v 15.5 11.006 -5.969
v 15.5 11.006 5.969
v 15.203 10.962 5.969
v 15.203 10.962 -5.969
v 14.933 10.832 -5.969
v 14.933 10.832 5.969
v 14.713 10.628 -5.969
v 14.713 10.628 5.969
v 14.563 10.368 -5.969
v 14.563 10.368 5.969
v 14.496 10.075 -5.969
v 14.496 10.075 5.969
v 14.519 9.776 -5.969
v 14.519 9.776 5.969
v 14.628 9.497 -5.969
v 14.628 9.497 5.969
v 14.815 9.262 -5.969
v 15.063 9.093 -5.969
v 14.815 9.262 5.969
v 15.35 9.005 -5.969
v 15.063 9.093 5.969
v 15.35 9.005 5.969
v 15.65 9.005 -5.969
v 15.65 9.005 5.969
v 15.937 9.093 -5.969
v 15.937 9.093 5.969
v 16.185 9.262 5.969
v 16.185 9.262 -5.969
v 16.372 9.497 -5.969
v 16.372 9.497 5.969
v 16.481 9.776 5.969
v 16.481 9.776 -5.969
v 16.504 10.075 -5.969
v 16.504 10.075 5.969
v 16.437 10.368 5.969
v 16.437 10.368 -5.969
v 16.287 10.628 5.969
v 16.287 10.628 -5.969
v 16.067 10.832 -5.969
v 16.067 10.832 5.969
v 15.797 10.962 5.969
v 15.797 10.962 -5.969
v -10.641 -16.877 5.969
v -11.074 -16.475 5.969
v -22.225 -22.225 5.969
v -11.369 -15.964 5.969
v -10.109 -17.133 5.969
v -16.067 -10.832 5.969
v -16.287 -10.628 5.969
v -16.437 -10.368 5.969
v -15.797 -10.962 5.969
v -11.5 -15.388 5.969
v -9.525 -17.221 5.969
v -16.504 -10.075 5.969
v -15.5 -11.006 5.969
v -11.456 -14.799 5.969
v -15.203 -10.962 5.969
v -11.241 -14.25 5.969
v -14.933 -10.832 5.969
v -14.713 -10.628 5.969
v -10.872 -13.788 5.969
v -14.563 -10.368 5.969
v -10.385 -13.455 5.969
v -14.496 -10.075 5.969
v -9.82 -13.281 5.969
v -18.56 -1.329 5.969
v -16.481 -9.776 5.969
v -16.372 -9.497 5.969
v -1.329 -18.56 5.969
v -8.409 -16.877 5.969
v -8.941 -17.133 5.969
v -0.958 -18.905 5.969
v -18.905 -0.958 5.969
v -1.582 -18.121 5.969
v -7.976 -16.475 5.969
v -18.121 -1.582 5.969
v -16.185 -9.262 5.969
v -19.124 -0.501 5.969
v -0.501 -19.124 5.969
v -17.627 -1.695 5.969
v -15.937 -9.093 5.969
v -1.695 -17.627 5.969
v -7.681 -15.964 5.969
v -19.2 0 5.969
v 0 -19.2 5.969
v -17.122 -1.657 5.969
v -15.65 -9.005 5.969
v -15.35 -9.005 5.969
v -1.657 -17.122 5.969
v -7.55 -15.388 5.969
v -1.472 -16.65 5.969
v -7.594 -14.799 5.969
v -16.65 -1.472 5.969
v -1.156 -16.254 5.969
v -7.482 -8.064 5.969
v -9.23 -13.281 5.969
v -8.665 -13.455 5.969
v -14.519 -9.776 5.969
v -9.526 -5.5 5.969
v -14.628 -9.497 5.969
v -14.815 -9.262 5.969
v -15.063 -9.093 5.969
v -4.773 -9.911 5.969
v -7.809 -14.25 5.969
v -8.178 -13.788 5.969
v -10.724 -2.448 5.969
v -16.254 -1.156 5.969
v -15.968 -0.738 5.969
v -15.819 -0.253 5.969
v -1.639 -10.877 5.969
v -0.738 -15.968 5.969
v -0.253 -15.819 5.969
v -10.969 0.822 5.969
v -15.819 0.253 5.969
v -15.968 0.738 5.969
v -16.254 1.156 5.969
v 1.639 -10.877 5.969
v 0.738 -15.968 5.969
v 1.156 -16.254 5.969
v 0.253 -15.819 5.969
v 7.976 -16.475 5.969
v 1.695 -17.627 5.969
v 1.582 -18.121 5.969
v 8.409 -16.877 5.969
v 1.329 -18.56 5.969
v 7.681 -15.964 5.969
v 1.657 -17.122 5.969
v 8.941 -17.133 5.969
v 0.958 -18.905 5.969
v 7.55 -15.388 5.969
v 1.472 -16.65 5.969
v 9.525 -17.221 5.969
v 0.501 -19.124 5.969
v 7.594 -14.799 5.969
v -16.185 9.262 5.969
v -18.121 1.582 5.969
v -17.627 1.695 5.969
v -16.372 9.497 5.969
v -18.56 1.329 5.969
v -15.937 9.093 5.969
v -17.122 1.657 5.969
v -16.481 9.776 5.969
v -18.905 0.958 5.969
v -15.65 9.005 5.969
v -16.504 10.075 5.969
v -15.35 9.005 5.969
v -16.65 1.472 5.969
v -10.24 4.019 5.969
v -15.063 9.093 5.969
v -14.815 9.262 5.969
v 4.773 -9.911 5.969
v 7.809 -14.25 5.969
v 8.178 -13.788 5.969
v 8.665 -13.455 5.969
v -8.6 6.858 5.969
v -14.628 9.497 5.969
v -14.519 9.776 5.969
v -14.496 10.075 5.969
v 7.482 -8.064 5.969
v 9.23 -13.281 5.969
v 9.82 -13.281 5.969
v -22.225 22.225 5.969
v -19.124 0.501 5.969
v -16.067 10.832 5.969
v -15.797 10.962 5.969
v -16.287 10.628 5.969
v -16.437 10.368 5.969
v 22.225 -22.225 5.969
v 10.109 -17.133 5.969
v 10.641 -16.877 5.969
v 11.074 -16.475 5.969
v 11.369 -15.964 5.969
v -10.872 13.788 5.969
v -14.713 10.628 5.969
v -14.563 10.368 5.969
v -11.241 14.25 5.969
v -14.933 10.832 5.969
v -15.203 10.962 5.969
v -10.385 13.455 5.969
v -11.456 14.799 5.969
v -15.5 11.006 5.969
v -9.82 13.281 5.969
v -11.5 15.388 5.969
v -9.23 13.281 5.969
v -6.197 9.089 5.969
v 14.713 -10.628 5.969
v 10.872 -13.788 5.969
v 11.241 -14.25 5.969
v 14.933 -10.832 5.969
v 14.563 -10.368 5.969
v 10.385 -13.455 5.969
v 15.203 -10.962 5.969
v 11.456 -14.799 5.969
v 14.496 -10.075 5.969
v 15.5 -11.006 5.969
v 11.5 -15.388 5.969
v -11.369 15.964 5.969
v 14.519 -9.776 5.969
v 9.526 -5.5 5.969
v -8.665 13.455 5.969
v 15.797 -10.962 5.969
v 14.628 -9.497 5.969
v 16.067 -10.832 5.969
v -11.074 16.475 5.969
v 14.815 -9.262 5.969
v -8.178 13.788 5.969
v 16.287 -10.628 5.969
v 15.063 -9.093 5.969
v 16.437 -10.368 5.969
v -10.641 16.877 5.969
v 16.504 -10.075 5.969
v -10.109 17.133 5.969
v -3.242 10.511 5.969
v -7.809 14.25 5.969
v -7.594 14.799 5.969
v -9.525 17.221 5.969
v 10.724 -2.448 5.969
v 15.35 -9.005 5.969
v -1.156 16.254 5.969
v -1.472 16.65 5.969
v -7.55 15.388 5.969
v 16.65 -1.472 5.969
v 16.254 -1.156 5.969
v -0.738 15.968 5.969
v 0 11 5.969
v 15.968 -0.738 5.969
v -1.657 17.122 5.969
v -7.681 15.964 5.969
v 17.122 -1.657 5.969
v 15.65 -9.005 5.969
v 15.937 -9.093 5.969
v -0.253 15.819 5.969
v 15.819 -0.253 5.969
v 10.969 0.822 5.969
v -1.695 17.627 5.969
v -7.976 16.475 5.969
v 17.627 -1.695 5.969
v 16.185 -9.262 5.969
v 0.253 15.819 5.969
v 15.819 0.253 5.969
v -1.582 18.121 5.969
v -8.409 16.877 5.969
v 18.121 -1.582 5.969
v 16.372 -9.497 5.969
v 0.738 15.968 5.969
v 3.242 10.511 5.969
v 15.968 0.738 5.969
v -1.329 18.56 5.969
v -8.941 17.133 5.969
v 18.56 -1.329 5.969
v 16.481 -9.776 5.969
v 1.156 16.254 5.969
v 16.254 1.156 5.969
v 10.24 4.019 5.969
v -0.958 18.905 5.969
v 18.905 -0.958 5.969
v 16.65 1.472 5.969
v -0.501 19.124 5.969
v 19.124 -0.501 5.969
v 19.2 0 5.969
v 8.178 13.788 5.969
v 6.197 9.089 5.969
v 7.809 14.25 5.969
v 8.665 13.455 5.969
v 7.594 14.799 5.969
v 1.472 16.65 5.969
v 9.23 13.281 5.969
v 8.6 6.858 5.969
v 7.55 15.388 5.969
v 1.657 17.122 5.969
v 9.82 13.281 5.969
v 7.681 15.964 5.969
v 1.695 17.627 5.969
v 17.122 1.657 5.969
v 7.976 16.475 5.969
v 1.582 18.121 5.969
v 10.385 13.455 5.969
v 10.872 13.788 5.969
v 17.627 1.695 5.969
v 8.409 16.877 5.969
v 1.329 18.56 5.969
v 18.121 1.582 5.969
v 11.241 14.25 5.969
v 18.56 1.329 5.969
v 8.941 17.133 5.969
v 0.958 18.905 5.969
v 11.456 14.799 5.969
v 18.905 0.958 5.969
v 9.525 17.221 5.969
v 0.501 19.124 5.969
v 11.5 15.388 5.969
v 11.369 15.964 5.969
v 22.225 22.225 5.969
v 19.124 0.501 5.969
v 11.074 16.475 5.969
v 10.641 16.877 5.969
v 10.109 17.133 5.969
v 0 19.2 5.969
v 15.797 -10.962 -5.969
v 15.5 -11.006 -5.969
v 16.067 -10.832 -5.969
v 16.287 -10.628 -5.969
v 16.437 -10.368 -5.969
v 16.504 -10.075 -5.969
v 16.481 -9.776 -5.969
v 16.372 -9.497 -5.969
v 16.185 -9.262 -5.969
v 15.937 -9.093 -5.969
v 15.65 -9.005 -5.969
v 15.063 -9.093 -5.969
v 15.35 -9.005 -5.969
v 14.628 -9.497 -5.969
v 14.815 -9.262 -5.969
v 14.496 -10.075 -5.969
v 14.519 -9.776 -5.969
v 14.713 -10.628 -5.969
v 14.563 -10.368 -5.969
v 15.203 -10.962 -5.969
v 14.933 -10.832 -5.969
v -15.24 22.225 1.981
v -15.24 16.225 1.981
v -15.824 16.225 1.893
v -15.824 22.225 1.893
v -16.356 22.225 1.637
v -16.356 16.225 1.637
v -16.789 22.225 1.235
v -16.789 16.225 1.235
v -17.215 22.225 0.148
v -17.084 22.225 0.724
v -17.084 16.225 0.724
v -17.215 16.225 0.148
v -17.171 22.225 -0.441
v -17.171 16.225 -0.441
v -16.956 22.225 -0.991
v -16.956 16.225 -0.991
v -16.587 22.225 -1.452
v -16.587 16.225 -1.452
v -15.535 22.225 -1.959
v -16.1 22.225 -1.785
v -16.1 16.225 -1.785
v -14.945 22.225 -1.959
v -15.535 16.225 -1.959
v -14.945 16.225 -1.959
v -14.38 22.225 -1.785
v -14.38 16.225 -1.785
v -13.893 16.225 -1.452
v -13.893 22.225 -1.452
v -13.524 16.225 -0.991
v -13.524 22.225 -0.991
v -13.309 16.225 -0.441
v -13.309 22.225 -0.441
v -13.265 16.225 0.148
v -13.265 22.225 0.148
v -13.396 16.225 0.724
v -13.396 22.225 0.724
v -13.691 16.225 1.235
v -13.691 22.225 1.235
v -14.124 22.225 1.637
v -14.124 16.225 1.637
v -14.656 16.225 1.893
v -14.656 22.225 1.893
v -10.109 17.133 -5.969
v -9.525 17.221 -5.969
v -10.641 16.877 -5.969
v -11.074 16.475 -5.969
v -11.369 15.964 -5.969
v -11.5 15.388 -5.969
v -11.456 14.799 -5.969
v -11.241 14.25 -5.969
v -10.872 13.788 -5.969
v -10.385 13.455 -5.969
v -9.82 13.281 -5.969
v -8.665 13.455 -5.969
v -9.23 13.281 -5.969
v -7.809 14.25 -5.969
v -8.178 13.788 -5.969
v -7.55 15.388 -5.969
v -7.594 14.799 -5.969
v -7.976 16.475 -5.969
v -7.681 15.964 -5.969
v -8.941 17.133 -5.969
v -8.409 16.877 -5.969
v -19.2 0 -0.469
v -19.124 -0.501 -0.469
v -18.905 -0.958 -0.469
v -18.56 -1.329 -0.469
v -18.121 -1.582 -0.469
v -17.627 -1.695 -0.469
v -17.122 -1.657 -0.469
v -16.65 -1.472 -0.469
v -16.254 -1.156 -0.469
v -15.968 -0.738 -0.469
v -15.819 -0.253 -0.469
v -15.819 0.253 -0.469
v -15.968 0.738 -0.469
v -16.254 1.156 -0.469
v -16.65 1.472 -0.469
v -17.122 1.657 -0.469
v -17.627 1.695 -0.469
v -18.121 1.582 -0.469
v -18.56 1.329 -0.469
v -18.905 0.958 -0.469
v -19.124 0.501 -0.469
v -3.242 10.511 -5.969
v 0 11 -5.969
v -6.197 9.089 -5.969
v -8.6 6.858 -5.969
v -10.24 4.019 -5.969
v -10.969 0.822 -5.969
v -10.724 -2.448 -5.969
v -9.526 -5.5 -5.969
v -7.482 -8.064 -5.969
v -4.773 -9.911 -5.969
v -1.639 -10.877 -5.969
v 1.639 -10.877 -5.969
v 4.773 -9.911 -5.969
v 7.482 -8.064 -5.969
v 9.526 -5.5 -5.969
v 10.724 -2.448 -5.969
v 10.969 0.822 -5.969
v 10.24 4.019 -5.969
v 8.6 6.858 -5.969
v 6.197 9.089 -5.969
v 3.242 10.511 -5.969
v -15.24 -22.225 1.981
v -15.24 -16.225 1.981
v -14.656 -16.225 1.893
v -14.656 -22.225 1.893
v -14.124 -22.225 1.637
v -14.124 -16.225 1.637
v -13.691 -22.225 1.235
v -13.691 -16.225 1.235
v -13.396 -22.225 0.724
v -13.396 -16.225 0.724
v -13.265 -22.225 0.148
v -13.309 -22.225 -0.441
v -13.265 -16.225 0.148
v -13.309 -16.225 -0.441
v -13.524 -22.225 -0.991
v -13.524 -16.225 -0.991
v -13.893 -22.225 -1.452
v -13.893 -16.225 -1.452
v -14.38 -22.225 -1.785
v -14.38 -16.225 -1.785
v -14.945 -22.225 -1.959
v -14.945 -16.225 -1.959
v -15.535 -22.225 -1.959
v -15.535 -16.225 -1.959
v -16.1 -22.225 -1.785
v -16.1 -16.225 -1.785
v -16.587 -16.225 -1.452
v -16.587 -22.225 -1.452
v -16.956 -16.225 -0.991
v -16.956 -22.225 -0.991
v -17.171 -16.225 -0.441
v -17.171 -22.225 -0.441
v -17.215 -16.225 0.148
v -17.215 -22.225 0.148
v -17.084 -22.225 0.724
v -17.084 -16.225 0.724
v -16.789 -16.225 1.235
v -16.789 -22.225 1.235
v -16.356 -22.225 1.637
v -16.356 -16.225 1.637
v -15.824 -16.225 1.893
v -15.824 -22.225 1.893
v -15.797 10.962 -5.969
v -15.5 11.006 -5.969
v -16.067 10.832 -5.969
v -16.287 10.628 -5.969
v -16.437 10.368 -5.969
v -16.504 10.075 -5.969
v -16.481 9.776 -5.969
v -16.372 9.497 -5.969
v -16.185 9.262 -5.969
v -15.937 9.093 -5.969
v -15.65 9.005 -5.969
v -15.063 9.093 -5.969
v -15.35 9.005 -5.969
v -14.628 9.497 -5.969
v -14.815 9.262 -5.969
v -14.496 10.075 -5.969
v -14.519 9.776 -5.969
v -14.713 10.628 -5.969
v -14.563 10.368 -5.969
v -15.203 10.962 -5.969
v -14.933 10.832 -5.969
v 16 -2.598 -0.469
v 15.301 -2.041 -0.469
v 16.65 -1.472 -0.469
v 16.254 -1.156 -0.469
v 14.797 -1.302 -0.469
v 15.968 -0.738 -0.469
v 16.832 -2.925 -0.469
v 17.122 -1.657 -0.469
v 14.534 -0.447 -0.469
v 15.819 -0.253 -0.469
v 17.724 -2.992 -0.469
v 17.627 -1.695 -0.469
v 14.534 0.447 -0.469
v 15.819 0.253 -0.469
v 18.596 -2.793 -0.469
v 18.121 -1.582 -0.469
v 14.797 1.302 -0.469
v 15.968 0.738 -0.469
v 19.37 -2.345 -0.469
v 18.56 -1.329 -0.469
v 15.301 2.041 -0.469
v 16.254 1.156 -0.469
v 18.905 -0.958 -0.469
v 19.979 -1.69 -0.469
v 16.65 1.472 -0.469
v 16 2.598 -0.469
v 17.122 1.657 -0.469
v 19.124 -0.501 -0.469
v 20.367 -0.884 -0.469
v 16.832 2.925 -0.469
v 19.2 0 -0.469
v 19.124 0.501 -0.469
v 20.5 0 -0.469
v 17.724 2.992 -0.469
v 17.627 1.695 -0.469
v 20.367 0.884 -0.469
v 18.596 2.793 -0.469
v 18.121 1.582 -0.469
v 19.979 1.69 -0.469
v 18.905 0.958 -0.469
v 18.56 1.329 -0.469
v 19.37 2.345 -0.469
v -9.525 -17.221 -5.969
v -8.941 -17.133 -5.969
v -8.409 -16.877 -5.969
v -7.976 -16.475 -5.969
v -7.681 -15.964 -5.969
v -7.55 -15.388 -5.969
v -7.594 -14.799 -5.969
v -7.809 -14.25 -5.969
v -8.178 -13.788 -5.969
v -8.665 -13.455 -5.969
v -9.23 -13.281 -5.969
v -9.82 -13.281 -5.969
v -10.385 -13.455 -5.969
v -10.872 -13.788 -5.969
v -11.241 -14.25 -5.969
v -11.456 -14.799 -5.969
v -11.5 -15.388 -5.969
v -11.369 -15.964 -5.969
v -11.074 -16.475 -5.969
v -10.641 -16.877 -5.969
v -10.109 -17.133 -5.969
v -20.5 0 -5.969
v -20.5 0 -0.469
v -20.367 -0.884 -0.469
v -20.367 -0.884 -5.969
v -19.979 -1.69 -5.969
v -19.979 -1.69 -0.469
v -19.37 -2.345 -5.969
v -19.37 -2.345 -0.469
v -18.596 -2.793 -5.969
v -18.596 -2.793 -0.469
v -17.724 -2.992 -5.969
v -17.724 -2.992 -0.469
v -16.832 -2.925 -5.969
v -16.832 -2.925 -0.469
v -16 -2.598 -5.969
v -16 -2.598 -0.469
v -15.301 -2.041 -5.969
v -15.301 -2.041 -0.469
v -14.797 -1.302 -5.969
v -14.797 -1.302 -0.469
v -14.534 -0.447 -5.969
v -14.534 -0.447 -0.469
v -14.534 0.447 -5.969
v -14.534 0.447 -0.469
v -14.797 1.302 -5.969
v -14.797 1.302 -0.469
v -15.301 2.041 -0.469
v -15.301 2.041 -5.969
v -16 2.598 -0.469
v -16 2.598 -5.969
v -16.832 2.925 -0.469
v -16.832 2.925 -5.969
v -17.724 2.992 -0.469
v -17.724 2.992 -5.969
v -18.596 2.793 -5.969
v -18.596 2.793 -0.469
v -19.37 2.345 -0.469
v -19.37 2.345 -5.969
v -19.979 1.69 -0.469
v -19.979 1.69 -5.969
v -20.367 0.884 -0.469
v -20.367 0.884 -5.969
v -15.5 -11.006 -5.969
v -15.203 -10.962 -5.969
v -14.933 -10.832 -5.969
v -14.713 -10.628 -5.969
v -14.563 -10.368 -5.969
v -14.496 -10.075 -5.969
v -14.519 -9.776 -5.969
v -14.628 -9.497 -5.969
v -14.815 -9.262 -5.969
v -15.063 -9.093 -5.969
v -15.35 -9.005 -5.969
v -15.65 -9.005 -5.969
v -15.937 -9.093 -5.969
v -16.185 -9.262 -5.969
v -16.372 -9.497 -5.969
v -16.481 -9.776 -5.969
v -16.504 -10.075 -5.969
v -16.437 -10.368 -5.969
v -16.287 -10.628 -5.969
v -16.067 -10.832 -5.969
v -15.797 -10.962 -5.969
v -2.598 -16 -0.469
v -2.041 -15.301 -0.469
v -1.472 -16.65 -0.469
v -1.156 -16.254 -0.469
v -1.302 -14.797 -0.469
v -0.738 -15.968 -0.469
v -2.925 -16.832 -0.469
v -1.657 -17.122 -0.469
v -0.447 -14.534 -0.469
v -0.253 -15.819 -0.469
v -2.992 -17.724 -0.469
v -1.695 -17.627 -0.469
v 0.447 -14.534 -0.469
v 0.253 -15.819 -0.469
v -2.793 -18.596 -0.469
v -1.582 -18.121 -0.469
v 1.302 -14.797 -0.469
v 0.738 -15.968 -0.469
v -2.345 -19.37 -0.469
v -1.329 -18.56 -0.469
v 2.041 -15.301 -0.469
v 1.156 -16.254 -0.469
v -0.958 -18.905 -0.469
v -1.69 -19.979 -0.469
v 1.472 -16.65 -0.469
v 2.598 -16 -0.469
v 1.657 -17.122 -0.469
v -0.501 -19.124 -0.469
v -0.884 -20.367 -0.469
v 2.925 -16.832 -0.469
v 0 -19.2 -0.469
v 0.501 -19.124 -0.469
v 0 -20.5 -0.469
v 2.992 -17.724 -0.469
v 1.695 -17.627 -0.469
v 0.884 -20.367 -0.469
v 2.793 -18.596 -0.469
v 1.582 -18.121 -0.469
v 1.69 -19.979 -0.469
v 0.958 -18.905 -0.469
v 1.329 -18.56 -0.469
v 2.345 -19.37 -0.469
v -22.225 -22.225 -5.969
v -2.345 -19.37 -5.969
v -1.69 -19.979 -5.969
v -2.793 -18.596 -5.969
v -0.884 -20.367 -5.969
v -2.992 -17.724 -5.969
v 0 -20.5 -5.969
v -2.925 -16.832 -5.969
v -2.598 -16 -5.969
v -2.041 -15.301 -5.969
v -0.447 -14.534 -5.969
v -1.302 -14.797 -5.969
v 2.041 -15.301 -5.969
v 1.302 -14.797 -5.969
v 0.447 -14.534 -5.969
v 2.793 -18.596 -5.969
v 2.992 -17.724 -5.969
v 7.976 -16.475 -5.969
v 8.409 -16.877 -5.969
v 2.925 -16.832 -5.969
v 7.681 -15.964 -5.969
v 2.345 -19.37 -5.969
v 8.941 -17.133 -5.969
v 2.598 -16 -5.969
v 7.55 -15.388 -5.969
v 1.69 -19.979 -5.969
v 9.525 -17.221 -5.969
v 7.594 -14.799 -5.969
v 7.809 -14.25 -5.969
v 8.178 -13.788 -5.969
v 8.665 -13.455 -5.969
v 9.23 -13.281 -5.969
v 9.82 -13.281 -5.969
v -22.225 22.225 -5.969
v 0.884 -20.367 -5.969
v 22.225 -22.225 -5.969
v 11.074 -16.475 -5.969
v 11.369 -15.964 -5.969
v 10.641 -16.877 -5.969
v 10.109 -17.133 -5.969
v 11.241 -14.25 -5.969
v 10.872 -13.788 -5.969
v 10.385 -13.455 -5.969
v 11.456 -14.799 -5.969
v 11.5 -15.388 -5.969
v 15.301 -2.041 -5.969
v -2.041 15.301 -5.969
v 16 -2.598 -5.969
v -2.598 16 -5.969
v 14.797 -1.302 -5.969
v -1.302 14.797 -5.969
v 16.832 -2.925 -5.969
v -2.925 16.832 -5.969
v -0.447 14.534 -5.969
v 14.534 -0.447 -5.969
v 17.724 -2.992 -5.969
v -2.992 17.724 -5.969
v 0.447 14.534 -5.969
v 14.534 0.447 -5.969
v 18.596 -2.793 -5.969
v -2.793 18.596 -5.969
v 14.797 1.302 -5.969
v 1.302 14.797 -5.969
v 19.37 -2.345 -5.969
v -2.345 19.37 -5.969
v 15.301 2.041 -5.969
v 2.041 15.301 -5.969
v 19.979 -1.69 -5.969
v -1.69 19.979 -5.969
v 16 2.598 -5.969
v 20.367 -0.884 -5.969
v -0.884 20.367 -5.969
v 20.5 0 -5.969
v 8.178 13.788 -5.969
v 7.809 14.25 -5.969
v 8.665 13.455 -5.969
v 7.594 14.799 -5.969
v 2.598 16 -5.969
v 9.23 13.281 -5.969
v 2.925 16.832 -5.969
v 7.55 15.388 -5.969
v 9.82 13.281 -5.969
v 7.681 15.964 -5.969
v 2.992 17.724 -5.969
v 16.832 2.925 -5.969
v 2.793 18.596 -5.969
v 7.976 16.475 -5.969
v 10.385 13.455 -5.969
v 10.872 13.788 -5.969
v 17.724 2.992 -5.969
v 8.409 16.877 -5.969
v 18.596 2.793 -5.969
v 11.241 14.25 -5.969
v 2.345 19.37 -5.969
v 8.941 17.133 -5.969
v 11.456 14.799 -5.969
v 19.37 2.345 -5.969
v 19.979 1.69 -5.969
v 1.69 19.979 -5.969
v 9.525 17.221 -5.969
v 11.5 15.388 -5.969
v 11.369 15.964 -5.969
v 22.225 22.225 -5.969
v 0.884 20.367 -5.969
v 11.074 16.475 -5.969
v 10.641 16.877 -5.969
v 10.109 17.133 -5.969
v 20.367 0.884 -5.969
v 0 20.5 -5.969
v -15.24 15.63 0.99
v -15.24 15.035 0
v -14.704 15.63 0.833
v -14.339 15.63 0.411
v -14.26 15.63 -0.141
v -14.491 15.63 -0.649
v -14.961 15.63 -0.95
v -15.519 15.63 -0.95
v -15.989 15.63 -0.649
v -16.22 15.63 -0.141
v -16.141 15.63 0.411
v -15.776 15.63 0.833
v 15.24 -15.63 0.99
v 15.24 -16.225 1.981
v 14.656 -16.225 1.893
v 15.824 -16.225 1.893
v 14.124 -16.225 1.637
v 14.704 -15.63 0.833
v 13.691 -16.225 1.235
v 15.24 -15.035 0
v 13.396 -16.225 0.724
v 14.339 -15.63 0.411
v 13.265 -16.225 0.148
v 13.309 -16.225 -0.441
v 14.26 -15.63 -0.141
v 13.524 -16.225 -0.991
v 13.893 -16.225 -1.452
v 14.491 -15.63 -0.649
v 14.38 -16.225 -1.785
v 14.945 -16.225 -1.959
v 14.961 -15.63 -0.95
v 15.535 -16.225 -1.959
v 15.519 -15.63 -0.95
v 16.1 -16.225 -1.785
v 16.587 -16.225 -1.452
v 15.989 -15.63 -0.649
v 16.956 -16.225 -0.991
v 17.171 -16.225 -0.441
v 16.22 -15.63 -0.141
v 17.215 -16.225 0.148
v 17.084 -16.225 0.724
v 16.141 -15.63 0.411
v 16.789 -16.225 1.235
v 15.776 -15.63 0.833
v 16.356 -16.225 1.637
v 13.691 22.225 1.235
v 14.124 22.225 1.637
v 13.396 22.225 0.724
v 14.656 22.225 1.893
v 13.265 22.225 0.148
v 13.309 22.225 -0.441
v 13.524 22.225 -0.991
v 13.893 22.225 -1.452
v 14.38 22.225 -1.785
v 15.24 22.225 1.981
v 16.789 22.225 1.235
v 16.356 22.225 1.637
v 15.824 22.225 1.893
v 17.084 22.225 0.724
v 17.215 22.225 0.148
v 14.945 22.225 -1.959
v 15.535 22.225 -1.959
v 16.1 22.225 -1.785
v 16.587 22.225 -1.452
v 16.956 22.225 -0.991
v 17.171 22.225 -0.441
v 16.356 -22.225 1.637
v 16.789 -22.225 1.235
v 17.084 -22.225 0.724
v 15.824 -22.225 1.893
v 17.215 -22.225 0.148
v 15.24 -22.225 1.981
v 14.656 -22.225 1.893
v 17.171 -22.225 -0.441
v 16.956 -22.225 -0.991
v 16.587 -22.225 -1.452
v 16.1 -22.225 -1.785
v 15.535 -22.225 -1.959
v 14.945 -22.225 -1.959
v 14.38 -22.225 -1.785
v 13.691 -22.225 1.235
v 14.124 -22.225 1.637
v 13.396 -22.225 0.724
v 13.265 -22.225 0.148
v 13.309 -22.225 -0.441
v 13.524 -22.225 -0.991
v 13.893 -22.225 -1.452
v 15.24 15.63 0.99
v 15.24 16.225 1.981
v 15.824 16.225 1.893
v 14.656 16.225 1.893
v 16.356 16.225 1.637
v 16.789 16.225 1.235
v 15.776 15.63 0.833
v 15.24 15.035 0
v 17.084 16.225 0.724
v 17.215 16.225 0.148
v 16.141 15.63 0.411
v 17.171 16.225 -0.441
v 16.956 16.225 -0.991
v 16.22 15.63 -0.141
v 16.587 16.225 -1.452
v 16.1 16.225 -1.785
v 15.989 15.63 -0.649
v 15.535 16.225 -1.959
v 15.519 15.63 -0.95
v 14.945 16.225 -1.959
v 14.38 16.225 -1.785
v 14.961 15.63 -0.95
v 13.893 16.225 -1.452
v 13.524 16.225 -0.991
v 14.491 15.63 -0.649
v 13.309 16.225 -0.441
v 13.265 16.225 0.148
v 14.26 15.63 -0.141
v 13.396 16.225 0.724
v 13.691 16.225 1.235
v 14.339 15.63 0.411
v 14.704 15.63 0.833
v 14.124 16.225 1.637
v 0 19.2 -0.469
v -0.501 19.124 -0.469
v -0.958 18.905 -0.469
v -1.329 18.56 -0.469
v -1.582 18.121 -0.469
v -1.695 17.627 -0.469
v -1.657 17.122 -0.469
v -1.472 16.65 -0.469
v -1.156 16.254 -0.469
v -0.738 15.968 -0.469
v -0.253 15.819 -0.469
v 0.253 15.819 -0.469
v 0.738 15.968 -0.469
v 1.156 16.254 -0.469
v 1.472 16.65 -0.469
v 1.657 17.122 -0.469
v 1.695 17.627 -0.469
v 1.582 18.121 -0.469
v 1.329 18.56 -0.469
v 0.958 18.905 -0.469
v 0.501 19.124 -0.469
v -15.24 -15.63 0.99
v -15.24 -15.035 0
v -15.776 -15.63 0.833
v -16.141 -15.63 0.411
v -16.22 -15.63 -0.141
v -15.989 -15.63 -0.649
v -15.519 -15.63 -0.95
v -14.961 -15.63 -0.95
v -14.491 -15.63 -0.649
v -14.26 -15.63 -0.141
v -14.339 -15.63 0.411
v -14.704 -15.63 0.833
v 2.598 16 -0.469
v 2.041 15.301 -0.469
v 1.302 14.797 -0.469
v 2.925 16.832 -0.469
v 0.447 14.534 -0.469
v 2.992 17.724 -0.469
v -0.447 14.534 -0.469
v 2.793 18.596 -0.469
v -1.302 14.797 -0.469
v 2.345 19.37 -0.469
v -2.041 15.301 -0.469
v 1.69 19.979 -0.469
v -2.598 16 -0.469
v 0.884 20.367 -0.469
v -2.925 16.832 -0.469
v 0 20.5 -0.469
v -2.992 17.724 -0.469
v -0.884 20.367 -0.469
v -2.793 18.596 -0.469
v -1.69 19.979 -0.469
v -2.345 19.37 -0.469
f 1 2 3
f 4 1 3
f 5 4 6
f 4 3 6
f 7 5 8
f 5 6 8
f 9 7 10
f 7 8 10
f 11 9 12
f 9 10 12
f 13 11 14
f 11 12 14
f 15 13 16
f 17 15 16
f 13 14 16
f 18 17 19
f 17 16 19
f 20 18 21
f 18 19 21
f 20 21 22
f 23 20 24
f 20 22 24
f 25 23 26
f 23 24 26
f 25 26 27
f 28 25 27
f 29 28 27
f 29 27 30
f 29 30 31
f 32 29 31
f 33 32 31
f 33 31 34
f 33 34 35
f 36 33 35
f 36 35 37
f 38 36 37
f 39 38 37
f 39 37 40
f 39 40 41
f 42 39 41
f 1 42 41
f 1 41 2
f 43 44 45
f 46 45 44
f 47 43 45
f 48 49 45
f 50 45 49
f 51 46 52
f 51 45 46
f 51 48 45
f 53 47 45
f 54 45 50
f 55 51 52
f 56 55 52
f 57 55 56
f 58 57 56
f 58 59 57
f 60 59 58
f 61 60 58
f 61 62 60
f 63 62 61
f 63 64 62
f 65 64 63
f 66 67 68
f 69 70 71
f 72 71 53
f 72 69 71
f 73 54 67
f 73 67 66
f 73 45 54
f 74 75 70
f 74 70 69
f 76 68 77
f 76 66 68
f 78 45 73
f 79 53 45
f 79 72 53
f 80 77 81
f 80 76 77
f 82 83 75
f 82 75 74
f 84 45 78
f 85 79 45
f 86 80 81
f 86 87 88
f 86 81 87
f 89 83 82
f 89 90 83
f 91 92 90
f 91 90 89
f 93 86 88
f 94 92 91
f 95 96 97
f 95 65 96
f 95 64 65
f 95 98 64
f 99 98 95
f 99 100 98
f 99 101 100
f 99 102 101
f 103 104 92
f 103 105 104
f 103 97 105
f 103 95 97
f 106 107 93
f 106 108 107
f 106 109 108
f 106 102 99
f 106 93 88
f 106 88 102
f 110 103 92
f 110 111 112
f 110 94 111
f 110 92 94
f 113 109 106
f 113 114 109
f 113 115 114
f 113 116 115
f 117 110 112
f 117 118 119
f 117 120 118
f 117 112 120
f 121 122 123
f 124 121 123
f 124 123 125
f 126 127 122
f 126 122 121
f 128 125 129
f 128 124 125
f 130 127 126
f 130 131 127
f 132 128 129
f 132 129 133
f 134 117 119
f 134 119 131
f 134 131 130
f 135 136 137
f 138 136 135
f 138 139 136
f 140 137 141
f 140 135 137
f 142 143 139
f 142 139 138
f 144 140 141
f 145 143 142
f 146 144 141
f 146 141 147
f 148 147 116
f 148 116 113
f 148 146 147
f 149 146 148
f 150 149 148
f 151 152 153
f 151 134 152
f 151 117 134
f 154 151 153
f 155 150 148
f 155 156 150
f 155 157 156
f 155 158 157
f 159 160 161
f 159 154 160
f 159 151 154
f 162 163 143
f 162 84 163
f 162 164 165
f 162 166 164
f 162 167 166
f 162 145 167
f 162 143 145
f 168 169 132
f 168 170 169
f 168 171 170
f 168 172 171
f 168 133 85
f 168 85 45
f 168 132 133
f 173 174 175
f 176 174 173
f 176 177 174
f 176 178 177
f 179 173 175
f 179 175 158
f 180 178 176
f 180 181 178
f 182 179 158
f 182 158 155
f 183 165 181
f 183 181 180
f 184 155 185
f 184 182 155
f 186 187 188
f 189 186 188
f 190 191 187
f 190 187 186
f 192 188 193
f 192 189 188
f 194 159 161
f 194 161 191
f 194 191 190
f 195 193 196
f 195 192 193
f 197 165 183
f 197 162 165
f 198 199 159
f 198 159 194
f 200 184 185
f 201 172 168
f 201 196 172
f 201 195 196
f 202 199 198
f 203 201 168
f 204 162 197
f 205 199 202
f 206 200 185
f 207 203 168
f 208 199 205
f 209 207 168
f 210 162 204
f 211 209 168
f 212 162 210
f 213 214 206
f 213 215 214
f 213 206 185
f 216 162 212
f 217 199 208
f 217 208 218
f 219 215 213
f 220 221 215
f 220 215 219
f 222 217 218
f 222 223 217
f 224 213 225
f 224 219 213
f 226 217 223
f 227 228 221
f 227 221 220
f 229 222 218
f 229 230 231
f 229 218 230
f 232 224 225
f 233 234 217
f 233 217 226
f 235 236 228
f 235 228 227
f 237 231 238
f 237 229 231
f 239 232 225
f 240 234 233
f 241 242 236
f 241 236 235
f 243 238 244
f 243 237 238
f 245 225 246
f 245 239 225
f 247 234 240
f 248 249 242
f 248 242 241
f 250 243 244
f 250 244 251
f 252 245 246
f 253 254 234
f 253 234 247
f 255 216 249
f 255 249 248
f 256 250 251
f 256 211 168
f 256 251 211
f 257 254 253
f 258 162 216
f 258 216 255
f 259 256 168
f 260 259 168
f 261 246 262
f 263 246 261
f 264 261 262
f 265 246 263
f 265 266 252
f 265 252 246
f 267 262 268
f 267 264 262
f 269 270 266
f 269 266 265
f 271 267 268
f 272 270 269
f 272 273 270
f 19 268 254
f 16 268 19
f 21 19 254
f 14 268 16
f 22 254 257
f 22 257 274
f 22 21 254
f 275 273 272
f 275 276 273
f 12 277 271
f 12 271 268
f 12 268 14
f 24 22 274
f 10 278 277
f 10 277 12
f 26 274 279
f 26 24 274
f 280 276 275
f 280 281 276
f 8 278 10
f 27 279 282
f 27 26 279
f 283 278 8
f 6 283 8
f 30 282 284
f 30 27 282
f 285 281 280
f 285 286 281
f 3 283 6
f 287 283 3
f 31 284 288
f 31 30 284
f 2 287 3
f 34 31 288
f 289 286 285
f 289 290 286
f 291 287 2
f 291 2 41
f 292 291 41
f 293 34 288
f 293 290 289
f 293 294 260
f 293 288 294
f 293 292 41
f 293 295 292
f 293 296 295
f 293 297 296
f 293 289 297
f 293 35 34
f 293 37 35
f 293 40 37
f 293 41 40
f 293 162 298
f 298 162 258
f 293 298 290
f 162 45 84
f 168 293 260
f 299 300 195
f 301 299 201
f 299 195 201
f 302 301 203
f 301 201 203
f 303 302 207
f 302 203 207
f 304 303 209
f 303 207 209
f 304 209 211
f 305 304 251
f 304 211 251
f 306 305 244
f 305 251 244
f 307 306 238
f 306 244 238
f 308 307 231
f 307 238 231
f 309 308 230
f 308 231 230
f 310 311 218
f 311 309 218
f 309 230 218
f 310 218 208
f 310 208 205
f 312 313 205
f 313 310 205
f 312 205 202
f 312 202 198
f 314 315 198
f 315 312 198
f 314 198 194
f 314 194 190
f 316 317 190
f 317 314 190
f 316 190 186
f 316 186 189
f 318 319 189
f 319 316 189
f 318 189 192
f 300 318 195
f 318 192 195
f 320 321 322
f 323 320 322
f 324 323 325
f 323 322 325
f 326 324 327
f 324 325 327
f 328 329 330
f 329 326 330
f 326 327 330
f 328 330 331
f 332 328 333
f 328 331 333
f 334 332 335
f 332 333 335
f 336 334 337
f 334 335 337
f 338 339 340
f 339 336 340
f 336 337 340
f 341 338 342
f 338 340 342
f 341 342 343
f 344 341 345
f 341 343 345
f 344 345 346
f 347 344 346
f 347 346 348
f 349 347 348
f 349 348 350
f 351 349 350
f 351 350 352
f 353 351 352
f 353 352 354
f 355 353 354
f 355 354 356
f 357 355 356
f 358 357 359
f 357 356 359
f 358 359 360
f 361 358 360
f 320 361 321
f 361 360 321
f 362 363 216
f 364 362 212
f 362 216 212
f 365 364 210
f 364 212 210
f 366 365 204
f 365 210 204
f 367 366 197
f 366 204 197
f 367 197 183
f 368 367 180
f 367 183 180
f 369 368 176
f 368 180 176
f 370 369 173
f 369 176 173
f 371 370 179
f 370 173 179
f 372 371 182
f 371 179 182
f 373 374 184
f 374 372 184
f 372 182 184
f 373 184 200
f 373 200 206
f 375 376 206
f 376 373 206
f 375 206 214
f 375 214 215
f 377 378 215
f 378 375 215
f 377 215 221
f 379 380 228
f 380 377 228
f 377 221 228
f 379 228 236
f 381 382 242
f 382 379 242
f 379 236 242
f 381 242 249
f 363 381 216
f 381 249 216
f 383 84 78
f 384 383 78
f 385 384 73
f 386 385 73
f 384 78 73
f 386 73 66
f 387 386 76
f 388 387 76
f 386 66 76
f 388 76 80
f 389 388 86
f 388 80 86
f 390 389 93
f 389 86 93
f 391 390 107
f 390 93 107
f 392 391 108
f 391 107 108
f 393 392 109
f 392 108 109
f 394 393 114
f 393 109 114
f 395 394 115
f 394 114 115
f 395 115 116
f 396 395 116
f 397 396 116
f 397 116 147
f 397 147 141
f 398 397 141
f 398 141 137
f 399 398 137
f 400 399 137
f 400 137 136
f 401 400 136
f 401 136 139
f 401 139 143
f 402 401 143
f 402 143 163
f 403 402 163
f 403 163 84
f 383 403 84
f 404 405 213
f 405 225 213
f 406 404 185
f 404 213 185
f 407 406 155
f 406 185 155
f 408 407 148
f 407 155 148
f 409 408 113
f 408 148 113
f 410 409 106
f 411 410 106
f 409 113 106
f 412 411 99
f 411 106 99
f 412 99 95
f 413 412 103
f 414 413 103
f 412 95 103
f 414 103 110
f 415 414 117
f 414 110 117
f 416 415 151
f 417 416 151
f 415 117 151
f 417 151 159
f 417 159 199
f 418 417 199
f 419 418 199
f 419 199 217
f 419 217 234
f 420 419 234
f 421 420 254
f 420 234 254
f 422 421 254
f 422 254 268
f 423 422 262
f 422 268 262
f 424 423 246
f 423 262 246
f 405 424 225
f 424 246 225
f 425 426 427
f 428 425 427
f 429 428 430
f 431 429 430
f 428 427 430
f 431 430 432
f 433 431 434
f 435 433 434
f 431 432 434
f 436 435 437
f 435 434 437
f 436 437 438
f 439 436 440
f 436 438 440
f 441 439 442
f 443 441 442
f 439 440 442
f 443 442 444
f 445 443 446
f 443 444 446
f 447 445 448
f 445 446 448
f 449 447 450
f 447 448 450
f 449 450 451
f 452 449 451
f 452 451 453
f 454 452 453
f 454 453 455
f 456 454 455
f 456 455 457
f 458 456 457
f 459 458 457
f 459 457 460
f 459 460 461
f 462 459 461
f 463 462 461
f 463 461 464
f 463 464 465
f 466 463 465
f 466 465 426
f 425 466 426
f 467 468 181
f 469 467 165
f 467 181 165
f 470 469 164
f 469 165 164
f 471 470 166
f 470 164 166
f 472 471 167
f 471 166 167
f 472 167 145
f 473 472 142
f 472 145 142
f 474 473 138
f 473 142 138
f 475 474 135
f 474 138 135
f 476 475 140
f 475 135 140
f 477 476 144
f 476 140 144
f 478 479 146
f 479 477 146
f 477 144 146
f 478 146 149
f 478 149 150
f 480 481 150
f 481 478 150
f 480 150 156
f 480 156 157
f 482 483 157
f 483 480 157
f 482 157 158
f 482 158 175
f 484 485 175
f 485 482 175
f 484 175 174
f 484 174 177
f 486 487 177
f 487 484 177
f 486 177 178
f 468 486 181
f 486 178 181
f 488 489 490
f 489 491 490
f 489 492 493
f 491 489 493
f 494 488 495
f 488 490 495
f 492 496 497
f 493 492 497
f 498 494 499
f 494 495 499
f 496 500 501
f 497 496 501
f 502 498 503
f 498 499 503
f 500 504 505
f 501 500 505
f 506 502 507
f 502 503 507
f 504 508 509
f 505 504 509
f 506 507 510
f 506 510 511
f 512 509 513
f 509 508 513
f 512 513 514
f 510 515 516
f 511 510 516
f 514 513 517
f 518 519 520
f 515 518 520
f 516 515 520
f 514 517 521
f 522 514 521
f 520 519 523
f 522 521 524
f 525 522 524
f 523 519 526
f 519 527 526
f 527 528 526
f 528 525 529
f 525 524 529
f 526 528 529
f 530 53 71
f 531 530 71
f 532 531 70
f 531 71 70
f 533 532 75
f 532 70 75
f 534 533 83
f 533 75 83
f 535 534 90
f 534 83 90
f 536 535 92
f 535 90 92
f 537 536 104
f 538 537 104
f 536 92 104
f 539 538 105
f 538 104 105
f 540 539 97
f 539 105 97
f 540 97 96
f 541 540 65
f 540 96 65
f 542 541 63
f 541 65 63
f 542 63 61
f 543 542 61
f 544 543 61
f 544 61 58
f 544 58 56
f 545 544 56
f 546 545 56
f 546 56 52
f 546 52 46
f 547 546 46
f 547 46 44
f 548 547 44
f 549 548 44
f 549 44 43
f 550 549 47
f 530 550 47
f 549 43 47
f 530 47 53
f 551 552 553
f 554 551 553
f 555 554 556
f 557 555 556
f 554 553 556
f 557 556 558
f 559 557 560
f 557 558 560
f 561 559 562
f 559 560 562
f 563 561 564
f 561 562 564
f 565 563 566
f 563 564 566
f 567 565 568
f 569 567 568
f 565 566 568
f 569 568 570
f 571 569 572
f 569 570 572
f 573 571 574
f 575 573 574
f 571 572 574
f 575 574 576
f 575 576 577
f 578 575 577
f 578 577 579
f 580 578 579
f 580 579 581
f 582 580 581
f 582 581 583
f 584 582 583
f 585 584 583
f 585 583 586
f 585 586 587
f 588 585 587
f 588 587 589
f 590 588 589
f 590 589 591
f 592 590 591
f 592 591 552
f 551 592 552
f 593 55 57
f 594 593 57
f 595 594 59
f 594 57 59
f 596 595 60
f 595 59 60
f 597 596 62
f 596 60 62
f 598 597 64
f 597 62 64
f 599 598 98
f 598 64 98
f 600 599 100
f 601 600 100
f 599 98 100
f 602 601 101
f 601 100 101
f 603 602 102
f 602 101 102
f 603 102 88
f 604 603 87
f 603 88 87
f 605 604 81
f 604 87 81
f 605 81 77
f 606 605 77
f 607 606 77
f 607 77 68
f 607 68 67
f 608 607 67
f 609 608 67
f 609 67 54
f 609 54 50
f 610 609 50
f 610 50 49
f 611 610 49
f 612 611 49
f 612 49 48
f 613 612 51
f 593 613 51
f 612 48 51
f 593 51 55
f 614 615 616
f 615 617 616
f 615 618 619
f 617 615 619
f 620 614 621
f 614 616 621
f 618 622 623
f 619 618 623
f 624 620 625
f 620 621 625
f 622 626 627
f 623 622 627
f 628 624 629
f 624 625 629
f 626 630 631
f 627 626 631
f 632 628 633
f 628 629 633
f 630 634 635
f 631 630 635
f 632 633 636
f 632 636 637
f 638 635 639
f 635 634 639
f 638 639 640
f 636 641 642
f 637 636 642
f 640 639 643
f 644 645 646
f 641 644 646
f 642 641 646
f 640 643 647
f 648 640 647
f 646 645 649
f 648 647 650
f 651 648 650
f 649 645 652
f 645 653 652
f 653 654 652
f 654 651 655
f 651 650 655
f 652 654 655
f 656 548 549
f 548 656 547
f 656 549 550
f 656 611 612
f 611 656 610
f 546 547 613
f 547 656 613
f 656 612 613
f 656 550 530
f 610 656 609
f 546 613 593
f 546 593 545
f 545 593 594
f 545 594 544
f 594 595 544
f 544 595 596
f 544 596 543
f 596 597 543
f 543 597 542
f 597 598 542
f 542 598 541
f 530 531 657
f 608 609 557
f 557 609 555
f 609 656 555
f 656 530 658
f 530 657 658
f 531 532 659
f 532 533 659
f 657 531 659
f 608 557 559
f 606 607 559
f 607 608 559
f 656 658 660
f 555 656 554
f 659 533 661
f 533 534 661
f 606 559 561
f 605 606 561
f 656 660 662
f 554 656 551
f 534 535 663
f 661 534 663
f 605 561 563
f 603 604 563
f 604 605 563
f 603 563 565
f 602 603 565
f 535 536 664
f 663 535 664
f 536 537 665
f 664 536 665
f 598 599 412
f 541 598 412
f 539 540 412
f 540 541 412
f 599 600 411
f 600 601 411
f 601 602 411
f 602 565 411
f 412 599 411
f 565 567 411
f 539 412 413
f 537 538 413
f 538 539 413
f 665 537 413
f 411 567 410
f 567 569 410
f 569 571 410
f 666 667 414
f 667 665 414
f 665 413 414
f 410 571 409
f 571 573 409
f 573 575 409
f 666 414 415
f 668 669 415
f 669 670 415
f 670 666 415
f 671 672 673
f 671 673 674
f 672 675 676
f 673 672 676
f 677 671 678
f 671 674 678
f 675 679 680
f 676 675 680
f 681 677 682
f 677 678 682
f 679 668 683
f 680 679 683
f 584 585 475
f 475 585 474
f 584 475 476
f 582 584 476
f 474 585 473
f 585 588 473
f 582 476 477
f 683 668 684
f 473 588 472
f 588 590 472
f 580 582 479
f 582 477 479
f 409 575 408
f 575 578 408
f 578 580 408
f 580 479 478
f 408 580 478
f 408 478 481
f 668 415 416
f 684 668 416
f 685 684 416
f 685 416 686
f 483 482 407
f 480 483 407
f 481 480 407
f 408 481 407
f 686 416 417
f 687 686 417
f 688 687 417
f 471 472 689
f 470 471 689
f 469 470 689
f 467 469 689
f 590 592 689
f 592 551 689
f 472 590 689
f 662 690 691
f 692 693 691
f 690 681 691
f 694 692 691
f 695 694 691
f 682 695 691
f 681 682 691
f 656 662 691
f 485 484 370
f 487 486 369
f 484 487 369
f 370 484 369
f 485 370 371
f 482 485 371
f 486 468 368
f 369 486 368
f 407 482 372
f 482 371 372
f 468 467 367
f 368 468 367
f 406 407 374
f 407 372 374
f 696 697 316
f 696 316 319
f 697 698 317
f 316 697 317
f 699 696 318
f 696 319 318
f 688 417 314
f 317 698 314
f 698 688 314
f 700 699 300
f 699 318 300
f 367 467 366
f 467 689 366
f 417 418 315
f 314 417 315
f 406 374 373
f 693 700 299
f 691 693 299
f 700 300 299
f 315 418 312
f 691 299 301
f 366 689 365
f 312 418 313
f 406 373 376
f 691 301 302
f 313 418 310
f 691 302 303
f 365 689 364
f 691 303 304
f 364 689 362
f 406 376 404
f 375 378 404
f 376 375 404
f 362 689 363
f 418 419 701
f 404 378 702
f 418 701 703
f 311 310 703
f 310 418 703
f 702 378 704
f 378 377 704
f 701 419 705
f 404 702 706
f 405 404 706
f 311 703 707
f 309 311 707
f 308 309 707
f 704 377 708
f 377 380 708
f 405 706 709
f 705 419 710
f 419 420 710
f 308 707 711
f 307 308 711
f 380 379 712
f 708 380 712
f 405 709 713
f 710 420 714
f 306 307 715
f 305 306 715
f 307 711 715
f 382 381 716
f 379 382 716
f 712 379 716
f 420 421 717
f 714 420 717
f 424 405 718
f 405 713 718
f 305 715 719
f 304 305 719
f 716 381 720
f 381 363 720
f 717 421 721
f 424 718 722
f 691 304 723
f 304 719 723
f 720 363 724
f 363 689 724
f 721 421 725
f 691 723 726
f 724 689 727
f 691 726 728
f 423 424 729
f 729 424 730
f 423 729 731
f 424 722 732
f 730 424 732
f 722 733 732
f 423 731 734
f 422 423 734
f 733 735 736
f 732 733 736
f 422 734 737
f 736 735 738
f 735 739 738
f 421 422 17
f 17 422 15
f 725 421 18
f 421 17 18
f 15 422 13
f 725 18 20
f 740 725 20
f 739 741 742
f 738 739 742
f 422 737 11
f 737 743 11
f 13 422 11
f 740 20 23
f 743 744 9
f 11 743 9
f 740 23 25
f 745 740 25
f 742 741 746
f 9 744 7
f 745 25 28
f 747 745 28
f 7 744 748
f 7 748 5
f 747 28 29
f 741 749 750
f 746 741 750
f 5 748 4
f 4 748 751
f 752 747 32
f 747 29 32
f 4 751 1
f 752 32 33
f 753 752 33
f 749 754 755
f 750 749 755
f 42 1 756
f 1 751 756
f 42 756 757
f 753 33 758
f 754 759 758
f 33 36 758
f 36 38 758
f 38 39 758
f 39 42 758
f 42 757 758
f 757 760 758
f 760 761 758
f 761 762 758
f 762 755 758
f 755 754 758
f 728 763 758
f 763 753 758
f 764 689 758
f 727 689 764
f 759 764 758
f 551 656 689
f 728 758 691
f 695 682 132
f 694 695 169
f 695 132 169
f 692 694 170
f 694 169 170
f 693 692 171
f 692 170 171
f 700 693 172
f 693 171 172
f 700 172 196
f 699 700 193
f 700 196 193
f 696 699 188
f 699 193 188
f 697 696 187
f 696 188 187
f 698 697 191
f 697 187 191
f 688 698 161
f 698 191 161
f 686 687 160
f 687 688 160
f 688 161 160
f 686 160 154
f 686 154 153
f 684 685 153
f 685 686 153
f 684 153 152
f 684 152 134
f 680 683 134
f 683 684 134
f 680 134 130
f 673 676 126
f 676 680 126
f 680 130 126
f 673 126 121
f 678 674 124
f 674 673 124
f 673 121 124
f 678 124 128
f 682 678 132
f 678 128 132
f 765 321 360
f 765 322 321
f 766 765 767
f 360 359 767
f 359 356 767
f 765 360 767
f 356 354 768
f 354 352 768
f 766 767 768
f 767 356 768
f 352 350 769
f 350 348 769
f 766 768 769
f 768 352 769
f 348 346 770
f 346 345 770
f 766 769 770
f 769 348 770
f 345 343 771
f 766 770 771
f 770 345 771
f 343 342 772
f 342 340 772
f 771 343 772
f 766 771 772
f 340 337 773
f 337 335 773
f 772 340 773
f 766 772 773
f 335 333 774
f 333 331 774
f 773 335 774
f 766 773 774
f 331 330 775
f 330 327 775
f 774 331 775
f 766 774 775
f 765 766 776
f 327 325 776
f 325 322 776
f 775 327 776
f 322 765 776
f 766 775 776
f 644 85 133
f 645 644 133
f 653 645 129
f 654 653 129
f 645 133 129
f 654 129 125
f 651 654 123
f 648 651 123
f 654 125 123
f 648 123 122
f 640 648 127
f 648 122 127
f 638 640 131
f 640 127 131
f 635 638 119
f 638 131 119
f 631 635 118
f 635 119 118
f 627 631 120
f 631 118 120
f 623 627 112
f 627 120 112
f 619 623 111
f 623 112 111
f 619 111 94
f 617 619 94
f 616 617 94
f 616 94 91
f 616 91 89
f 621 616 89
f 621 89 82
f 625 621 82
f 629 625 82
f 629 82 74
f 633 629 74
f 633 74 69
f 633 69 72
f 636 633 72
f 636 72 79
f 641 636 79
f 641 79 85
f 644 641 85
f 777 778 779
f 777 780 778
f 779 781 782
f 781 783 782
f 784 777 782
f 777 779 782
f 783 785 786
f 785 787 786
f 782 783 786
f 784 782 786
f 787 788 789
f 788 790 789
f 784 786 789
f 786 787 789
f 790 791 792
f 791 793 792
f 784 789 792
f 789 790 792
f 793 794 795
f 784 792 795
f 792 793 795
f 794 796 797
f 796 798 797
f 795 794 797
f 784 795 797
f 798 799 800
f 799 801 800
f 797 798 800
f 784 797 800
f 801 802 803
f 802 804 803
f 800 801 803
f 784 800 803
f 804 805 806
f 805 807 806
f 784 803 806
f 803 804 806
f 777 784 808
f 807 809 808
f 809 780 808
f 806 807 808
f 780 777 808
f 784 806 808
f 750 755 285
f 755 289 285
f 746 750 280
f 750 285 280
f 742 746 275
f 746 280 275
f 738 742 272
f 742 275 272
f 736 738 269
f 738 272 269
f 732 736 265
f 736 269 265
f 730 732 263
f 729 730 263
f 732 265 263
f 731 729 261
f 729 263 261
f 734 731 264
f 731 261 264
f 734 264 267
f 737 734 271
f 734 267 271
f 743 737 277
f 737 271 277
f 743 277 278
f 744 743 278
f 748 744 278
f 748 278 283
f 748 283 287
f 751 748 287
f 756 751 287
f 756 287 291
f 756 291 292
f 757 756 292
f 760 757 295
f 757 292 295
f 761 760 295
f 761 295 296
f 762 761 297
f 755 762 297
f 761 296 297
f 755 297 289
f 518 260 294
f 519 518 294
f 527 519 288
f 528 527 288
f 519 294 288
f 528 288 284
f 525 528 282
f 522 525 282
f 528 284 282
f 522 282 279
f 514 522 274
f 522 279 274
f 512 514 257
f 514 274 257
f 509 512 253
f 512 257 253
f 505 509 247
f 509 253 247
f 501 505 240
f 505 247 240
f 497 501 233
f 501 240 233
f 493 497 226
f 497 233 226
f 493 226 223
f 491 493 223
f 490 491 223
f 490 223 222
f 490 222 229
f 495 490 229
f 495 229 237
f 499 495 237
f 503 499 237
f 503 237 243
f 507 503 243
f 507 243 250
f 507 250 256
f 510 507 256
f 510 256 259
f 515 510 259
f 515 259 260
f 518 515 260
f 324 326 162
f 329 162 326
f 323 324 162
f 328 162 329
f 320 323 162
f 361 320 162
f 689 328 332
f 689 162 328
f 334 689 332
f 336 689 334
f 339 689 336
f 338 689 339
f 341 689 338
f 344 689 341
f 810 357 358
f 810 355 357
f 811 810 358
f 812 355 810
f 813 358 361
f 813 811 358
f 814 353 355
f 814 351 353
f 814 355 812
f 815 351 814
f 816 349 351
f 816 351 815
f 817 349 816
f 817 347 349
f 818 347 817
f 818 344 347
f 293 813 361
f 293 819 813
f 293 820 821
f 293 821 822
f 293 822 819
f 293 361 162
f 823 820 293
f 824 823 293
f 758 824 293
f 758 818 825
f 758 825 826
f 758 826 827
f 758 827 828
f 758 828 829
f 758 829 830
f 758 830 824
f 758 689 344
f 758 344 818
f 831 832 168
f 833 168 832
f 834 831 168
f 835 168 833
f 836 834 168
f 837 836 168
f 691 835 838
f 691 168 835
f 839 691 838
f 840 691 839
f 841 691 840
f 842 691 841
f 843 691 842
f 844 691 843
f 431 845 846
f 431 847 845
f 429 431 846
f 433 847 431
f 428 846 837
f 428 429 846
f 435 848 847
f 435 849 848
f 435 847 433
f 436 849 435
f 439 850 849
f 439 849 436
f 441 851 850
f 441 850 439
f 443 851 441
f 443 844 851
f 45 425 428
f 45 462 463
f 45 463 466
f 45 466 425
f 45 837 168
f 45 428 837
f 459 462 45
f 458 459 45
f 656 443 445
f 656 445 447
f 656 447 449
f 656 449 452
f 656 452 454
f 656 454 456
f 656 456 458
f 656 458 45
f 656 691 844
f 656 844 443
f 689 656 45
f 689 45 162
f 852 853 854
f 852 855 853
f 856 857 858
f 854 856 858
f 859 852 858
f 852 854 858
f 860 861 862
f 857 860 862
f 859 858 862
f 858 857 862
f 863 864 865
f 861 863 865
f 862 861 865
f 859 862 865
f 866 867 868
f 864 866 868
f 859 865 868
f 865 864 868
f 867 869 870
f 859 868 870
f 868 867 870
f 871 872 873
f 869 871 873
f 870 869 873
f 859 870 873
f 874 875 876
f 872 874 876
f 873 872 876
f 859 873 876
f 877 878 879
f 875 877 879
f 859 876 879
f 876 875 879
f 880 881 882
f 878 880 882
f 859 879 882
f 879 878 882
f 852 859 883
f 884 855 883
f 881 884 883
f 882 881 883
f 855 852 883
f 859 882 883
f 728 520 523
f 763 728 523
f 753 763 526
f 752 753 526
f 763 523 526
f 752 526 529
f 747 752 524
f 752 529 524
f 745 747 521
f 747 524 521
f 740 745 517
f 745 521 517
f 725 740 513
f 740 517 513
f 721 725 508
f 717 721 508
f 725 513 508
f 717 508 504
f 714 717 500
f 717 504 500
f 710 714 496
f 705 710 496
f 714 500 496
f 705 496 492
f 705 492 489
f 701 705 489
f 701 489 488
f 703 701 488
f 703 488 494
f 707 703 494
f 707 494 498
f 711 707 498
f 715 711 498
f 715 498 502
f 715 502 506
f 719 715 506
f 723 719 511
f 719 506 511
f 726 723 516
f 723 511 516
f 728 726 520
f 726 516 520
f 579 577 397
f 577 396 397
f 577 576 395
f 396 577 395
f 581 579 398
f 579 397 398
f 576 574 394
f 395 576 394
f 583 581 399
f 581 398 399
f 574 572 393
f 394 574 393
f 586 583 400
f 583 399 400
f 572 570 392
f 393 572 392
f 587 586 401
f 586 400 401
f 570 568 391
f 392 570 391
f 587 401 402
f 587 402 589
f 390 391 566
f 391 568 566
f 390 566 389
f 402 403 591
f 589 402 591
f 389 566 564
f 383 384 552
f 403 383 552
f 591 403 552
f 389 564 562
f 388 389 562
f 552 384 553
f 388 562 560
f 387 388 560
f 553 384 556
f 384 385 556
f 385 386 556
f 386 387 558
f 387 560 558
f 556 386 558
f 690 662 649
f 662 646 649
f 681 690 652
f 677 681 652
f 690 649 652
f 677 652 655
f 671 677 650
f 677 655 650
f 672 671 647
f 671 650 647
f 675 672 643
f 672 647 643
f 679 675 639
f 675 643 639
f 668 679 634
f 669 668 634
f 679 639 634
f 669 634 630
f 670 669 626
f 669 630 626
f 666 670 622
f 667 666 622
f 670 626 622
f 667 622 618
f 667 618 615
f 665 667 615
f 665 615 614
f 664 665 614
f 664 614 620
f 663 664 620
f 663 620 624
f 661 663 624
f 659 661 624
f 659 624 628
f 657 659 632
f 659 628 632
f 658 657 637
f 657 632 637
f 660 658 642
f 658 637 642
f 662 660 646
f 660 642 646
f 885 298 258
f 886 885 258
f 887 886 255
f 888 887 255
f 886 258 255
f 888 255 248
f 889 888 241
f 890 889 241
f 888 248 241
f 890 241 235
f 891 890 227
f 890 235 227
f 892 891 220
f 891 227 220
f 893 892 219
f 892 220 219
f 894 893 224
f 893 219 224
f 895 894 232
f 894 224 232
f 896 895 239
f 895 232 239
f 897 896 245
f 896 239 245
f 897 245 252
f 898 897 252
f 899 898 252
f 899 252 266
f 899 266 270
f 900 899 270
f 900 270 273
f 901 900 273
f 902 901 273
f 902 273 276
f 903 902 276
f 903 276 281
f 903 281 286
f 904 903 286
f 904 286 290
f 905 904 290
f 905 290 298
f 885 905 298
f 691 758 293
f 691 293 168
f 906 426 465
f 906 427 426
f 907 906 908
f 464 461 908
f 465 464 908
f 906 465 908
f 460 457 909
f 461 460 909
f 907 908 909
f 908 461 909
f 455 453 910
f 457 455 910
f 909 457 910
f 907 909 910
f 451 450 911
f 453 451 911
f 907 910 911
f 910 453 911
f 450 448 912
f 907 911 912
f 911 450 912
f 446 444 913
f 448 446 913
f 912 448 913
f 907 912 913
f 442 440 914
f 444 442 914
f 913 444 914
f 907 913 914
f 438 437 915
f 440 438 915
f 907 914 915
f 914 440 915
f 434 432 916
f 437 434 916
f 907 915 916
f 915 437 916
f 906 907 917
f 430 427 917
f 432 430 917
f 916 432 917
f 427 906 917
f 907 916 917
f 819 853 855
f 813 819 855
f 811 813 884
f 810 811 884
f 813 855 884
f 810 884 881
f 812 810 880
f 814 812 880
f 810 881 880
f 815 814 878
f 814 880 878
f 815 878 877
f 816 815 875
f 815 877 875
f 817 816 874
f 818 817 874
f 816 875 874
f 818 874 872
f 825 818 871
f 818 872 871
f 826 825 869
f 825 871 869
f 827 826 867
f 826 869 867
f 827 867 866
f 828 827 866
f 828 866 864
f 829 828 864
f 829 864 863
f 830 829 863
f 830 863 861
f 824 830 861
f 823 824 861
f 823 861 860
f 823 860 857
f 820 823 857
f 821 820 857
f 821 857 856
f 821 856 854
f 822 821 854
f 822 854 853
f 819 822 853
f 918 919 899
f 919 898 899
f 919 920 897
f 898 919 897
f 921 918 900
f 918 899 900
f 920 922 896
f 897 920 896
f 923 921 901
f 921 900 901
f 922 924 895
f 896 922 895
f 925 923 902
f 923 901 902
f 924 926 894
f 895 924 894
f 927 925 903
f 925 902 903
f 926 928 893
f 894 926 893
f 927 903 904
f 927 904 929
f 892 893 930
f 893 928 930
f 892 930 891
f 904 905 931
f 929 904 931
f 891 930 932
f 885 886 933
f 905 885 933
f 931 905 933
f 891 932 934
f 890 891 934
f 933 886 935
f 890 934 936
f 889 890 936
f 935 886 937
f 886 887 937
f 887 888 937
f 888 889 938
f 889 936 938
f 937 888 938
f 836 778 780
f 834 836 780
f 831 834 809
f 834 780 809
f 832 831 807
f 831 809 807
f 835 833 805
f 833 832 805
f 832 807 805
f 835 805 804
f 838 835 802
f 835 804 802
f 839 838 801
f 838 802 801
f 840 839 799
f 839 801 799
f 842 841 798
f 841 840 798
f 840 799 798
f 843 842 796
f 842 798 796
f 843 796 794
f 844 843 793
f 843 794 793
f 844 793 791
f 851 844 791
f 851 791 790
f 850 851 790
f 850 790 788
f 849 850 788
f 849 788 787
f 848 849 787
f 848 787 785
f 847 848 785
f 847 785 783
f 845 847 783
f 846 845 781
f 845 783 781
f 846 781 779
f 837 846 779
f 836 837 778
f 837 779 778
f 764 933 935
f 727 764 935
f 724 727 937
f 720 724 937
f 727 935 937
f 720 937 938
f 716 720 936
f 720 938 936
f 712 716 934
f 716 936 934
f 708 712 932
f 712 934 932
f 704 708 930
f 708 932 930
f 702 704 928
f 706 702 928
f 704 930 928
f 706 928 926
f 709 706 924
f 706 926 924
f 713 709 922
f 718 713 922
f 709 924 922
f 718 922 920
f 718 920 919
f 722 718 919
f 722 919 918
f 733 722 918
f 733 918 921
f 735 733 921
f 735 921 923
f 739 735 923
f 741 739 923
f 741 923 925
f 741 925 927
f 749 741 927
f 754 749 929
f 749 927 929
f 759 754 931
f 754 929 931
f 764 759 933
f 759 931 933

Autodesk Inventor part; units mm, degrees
ref_plane "YZ Plane" through (0, 0, 0) normal (1, 0, 0) x (0, 1, 0)
ref_plane "XZ Plane" through (0, 0, 0) normal (0, 1, 0) x (-1, 0, 0)
ref_plane "XY Plane" through (0, 0, 0) normal (0, 0, 1) x (1, 0, 0)
sketch "Sketch1" plane through (0, 0, 0) normal (0, 0, 1) x (1, 0, 0)
  line L0 (-22.225, 22.225) -> (22.225, 22.225)
  line L1 (22.225, 22.225) -> (22.225, -22.225)
  line L2 (22.225, -22.225) -> (-22.225, -22.225)
  line L3 (-22.225, -22.225) -> (-22.225, 22.225)
  line L4 (0, 0) -> (0, 22.225) construction
  line L5 (0, 0) -> (0, -22.225) construction
  line L6 (0, 0) -> (22.225, 0) construction
  line L7 (0, 0) -> (-22.225, 0) construction
  dimension "d0" = 44.45
  dimension "d1" = 44.45
extrude "Extrusion1" add sketch "Sketch1" along normal mid plane 11.938
sketch "Sketch2" plane through (0, 0, -5.969) normal (0, 0, -1) x (-1, 0, 0)
  point P0 (0, 0)
hole "Hole1" at (0, 0, -5.969) direction (0, 0, 1) diameter 22 end through all
sketch "Sketch3" plane through (0, 0, -5.969) normal (0, 0, -1) x (-1, 0, 0)
  circle A0 centre (0, 0) radius 11 projected
  point P0 (0, 17.5)
  dimension "d11" = 17.5
hole "Hole2" at (0, 17.5, -5.969) direction (0, 0, 1) diameter 3.4 end through all counterbore diameter 6 counterbore depth 5.5
pattern_circular "Circular Pattern1" count 4 over 360 about axis through (0, 0, 58.0163) along (0, 0, -1) of "Hole2"
sketch "Sketch4" plane through (0, 0, -5.969) normal (0, 0, -1) x (-1, 0, 0)
  circle A0 centre (0, 0) radius 11 projected
  circle A1 centre (0, 17.5) radius 3 projected
  point P0 (-9.525, 15.24)
  dimension "d22" = 15.24
  dimension "d49" = 9.525
hole "Hole3" at (9.525, 15.24, -5.969) direction (0, 0, 1) diameter 3.962 end through all thread size "10-32 UNF" class "2B" standard "ANSI Unified Screw Threads"
mirror "Mirror1" about plane through (0, 0, 0) normal (1, 0, 0) of "Hole3"
mirror "Mirror2" about plane through (0, 0, 0) normal (0, 1, 0) of "Hole3", "Mirror1"
sketch "Sketch5" plane through (0, 0, -5.969) normal (0, 0, -1) x (-1, 0, 0)
  circle A0 centre (0, 0) radius 11 projected
  point P0 (-15.5, 10)
  dimension "d31" = 10
  dimension "d32" = 15.5
hole "Hole4" at (15.5, 10, -5.969) direction (0, 0, 1) diameter 2.013 end through all thread size "M2.5x0.45" class "6H" standard "ANSI Metric M Profile"
mirror "Mirror3" about plane through (0, 0, 0) normal (0, 1, 0) of "Hole4"
mirror "Mirror4" about plane through (0, 0, 0) normal (1, 0, 0) of "Hole4", "Mirror3", "Hole1"
sketch "Sketch6" plane through (-22.225, 22.225, 5.969) normal (0, 1, 0) x (1, 0, 0)
  line L0 (0, 0) -> (44.45, 0) projected
  line L1 (44.45, 11.938) -> (0, 11.938) projected
  line L2 (22.225, 0) -> (22.225, 11.938) construction
  line L3 (44.45, 0) -> (44.45, 11.938) projected
  line L4 (0, 11.938) -> (0, 0) projected
  line L5 (0, 5.969) -> (44.45, 5.969) construction
  point P0 (37.465, 5.969)
  dimension "d41" = 15.24
hole "Hole5" at (15.24, 22.225, 0) direction (0, -1, 0) diameter 3.962 depth 6 tip angle 118 thread size "10-32 UNF" class "2B" standard "ANSI Unified Screw Threads"
mirror "Mirror5" about plane through (0, 0, 0) normal (1, 0, 0) of "Hole5"
mirror "Mirror6" about plane through (0, 0, 0) normal (0, 1, 0) of "Hole5", "Mirror5"
properties part number "BB1-FrontPlate" material "Steel, Mild"
